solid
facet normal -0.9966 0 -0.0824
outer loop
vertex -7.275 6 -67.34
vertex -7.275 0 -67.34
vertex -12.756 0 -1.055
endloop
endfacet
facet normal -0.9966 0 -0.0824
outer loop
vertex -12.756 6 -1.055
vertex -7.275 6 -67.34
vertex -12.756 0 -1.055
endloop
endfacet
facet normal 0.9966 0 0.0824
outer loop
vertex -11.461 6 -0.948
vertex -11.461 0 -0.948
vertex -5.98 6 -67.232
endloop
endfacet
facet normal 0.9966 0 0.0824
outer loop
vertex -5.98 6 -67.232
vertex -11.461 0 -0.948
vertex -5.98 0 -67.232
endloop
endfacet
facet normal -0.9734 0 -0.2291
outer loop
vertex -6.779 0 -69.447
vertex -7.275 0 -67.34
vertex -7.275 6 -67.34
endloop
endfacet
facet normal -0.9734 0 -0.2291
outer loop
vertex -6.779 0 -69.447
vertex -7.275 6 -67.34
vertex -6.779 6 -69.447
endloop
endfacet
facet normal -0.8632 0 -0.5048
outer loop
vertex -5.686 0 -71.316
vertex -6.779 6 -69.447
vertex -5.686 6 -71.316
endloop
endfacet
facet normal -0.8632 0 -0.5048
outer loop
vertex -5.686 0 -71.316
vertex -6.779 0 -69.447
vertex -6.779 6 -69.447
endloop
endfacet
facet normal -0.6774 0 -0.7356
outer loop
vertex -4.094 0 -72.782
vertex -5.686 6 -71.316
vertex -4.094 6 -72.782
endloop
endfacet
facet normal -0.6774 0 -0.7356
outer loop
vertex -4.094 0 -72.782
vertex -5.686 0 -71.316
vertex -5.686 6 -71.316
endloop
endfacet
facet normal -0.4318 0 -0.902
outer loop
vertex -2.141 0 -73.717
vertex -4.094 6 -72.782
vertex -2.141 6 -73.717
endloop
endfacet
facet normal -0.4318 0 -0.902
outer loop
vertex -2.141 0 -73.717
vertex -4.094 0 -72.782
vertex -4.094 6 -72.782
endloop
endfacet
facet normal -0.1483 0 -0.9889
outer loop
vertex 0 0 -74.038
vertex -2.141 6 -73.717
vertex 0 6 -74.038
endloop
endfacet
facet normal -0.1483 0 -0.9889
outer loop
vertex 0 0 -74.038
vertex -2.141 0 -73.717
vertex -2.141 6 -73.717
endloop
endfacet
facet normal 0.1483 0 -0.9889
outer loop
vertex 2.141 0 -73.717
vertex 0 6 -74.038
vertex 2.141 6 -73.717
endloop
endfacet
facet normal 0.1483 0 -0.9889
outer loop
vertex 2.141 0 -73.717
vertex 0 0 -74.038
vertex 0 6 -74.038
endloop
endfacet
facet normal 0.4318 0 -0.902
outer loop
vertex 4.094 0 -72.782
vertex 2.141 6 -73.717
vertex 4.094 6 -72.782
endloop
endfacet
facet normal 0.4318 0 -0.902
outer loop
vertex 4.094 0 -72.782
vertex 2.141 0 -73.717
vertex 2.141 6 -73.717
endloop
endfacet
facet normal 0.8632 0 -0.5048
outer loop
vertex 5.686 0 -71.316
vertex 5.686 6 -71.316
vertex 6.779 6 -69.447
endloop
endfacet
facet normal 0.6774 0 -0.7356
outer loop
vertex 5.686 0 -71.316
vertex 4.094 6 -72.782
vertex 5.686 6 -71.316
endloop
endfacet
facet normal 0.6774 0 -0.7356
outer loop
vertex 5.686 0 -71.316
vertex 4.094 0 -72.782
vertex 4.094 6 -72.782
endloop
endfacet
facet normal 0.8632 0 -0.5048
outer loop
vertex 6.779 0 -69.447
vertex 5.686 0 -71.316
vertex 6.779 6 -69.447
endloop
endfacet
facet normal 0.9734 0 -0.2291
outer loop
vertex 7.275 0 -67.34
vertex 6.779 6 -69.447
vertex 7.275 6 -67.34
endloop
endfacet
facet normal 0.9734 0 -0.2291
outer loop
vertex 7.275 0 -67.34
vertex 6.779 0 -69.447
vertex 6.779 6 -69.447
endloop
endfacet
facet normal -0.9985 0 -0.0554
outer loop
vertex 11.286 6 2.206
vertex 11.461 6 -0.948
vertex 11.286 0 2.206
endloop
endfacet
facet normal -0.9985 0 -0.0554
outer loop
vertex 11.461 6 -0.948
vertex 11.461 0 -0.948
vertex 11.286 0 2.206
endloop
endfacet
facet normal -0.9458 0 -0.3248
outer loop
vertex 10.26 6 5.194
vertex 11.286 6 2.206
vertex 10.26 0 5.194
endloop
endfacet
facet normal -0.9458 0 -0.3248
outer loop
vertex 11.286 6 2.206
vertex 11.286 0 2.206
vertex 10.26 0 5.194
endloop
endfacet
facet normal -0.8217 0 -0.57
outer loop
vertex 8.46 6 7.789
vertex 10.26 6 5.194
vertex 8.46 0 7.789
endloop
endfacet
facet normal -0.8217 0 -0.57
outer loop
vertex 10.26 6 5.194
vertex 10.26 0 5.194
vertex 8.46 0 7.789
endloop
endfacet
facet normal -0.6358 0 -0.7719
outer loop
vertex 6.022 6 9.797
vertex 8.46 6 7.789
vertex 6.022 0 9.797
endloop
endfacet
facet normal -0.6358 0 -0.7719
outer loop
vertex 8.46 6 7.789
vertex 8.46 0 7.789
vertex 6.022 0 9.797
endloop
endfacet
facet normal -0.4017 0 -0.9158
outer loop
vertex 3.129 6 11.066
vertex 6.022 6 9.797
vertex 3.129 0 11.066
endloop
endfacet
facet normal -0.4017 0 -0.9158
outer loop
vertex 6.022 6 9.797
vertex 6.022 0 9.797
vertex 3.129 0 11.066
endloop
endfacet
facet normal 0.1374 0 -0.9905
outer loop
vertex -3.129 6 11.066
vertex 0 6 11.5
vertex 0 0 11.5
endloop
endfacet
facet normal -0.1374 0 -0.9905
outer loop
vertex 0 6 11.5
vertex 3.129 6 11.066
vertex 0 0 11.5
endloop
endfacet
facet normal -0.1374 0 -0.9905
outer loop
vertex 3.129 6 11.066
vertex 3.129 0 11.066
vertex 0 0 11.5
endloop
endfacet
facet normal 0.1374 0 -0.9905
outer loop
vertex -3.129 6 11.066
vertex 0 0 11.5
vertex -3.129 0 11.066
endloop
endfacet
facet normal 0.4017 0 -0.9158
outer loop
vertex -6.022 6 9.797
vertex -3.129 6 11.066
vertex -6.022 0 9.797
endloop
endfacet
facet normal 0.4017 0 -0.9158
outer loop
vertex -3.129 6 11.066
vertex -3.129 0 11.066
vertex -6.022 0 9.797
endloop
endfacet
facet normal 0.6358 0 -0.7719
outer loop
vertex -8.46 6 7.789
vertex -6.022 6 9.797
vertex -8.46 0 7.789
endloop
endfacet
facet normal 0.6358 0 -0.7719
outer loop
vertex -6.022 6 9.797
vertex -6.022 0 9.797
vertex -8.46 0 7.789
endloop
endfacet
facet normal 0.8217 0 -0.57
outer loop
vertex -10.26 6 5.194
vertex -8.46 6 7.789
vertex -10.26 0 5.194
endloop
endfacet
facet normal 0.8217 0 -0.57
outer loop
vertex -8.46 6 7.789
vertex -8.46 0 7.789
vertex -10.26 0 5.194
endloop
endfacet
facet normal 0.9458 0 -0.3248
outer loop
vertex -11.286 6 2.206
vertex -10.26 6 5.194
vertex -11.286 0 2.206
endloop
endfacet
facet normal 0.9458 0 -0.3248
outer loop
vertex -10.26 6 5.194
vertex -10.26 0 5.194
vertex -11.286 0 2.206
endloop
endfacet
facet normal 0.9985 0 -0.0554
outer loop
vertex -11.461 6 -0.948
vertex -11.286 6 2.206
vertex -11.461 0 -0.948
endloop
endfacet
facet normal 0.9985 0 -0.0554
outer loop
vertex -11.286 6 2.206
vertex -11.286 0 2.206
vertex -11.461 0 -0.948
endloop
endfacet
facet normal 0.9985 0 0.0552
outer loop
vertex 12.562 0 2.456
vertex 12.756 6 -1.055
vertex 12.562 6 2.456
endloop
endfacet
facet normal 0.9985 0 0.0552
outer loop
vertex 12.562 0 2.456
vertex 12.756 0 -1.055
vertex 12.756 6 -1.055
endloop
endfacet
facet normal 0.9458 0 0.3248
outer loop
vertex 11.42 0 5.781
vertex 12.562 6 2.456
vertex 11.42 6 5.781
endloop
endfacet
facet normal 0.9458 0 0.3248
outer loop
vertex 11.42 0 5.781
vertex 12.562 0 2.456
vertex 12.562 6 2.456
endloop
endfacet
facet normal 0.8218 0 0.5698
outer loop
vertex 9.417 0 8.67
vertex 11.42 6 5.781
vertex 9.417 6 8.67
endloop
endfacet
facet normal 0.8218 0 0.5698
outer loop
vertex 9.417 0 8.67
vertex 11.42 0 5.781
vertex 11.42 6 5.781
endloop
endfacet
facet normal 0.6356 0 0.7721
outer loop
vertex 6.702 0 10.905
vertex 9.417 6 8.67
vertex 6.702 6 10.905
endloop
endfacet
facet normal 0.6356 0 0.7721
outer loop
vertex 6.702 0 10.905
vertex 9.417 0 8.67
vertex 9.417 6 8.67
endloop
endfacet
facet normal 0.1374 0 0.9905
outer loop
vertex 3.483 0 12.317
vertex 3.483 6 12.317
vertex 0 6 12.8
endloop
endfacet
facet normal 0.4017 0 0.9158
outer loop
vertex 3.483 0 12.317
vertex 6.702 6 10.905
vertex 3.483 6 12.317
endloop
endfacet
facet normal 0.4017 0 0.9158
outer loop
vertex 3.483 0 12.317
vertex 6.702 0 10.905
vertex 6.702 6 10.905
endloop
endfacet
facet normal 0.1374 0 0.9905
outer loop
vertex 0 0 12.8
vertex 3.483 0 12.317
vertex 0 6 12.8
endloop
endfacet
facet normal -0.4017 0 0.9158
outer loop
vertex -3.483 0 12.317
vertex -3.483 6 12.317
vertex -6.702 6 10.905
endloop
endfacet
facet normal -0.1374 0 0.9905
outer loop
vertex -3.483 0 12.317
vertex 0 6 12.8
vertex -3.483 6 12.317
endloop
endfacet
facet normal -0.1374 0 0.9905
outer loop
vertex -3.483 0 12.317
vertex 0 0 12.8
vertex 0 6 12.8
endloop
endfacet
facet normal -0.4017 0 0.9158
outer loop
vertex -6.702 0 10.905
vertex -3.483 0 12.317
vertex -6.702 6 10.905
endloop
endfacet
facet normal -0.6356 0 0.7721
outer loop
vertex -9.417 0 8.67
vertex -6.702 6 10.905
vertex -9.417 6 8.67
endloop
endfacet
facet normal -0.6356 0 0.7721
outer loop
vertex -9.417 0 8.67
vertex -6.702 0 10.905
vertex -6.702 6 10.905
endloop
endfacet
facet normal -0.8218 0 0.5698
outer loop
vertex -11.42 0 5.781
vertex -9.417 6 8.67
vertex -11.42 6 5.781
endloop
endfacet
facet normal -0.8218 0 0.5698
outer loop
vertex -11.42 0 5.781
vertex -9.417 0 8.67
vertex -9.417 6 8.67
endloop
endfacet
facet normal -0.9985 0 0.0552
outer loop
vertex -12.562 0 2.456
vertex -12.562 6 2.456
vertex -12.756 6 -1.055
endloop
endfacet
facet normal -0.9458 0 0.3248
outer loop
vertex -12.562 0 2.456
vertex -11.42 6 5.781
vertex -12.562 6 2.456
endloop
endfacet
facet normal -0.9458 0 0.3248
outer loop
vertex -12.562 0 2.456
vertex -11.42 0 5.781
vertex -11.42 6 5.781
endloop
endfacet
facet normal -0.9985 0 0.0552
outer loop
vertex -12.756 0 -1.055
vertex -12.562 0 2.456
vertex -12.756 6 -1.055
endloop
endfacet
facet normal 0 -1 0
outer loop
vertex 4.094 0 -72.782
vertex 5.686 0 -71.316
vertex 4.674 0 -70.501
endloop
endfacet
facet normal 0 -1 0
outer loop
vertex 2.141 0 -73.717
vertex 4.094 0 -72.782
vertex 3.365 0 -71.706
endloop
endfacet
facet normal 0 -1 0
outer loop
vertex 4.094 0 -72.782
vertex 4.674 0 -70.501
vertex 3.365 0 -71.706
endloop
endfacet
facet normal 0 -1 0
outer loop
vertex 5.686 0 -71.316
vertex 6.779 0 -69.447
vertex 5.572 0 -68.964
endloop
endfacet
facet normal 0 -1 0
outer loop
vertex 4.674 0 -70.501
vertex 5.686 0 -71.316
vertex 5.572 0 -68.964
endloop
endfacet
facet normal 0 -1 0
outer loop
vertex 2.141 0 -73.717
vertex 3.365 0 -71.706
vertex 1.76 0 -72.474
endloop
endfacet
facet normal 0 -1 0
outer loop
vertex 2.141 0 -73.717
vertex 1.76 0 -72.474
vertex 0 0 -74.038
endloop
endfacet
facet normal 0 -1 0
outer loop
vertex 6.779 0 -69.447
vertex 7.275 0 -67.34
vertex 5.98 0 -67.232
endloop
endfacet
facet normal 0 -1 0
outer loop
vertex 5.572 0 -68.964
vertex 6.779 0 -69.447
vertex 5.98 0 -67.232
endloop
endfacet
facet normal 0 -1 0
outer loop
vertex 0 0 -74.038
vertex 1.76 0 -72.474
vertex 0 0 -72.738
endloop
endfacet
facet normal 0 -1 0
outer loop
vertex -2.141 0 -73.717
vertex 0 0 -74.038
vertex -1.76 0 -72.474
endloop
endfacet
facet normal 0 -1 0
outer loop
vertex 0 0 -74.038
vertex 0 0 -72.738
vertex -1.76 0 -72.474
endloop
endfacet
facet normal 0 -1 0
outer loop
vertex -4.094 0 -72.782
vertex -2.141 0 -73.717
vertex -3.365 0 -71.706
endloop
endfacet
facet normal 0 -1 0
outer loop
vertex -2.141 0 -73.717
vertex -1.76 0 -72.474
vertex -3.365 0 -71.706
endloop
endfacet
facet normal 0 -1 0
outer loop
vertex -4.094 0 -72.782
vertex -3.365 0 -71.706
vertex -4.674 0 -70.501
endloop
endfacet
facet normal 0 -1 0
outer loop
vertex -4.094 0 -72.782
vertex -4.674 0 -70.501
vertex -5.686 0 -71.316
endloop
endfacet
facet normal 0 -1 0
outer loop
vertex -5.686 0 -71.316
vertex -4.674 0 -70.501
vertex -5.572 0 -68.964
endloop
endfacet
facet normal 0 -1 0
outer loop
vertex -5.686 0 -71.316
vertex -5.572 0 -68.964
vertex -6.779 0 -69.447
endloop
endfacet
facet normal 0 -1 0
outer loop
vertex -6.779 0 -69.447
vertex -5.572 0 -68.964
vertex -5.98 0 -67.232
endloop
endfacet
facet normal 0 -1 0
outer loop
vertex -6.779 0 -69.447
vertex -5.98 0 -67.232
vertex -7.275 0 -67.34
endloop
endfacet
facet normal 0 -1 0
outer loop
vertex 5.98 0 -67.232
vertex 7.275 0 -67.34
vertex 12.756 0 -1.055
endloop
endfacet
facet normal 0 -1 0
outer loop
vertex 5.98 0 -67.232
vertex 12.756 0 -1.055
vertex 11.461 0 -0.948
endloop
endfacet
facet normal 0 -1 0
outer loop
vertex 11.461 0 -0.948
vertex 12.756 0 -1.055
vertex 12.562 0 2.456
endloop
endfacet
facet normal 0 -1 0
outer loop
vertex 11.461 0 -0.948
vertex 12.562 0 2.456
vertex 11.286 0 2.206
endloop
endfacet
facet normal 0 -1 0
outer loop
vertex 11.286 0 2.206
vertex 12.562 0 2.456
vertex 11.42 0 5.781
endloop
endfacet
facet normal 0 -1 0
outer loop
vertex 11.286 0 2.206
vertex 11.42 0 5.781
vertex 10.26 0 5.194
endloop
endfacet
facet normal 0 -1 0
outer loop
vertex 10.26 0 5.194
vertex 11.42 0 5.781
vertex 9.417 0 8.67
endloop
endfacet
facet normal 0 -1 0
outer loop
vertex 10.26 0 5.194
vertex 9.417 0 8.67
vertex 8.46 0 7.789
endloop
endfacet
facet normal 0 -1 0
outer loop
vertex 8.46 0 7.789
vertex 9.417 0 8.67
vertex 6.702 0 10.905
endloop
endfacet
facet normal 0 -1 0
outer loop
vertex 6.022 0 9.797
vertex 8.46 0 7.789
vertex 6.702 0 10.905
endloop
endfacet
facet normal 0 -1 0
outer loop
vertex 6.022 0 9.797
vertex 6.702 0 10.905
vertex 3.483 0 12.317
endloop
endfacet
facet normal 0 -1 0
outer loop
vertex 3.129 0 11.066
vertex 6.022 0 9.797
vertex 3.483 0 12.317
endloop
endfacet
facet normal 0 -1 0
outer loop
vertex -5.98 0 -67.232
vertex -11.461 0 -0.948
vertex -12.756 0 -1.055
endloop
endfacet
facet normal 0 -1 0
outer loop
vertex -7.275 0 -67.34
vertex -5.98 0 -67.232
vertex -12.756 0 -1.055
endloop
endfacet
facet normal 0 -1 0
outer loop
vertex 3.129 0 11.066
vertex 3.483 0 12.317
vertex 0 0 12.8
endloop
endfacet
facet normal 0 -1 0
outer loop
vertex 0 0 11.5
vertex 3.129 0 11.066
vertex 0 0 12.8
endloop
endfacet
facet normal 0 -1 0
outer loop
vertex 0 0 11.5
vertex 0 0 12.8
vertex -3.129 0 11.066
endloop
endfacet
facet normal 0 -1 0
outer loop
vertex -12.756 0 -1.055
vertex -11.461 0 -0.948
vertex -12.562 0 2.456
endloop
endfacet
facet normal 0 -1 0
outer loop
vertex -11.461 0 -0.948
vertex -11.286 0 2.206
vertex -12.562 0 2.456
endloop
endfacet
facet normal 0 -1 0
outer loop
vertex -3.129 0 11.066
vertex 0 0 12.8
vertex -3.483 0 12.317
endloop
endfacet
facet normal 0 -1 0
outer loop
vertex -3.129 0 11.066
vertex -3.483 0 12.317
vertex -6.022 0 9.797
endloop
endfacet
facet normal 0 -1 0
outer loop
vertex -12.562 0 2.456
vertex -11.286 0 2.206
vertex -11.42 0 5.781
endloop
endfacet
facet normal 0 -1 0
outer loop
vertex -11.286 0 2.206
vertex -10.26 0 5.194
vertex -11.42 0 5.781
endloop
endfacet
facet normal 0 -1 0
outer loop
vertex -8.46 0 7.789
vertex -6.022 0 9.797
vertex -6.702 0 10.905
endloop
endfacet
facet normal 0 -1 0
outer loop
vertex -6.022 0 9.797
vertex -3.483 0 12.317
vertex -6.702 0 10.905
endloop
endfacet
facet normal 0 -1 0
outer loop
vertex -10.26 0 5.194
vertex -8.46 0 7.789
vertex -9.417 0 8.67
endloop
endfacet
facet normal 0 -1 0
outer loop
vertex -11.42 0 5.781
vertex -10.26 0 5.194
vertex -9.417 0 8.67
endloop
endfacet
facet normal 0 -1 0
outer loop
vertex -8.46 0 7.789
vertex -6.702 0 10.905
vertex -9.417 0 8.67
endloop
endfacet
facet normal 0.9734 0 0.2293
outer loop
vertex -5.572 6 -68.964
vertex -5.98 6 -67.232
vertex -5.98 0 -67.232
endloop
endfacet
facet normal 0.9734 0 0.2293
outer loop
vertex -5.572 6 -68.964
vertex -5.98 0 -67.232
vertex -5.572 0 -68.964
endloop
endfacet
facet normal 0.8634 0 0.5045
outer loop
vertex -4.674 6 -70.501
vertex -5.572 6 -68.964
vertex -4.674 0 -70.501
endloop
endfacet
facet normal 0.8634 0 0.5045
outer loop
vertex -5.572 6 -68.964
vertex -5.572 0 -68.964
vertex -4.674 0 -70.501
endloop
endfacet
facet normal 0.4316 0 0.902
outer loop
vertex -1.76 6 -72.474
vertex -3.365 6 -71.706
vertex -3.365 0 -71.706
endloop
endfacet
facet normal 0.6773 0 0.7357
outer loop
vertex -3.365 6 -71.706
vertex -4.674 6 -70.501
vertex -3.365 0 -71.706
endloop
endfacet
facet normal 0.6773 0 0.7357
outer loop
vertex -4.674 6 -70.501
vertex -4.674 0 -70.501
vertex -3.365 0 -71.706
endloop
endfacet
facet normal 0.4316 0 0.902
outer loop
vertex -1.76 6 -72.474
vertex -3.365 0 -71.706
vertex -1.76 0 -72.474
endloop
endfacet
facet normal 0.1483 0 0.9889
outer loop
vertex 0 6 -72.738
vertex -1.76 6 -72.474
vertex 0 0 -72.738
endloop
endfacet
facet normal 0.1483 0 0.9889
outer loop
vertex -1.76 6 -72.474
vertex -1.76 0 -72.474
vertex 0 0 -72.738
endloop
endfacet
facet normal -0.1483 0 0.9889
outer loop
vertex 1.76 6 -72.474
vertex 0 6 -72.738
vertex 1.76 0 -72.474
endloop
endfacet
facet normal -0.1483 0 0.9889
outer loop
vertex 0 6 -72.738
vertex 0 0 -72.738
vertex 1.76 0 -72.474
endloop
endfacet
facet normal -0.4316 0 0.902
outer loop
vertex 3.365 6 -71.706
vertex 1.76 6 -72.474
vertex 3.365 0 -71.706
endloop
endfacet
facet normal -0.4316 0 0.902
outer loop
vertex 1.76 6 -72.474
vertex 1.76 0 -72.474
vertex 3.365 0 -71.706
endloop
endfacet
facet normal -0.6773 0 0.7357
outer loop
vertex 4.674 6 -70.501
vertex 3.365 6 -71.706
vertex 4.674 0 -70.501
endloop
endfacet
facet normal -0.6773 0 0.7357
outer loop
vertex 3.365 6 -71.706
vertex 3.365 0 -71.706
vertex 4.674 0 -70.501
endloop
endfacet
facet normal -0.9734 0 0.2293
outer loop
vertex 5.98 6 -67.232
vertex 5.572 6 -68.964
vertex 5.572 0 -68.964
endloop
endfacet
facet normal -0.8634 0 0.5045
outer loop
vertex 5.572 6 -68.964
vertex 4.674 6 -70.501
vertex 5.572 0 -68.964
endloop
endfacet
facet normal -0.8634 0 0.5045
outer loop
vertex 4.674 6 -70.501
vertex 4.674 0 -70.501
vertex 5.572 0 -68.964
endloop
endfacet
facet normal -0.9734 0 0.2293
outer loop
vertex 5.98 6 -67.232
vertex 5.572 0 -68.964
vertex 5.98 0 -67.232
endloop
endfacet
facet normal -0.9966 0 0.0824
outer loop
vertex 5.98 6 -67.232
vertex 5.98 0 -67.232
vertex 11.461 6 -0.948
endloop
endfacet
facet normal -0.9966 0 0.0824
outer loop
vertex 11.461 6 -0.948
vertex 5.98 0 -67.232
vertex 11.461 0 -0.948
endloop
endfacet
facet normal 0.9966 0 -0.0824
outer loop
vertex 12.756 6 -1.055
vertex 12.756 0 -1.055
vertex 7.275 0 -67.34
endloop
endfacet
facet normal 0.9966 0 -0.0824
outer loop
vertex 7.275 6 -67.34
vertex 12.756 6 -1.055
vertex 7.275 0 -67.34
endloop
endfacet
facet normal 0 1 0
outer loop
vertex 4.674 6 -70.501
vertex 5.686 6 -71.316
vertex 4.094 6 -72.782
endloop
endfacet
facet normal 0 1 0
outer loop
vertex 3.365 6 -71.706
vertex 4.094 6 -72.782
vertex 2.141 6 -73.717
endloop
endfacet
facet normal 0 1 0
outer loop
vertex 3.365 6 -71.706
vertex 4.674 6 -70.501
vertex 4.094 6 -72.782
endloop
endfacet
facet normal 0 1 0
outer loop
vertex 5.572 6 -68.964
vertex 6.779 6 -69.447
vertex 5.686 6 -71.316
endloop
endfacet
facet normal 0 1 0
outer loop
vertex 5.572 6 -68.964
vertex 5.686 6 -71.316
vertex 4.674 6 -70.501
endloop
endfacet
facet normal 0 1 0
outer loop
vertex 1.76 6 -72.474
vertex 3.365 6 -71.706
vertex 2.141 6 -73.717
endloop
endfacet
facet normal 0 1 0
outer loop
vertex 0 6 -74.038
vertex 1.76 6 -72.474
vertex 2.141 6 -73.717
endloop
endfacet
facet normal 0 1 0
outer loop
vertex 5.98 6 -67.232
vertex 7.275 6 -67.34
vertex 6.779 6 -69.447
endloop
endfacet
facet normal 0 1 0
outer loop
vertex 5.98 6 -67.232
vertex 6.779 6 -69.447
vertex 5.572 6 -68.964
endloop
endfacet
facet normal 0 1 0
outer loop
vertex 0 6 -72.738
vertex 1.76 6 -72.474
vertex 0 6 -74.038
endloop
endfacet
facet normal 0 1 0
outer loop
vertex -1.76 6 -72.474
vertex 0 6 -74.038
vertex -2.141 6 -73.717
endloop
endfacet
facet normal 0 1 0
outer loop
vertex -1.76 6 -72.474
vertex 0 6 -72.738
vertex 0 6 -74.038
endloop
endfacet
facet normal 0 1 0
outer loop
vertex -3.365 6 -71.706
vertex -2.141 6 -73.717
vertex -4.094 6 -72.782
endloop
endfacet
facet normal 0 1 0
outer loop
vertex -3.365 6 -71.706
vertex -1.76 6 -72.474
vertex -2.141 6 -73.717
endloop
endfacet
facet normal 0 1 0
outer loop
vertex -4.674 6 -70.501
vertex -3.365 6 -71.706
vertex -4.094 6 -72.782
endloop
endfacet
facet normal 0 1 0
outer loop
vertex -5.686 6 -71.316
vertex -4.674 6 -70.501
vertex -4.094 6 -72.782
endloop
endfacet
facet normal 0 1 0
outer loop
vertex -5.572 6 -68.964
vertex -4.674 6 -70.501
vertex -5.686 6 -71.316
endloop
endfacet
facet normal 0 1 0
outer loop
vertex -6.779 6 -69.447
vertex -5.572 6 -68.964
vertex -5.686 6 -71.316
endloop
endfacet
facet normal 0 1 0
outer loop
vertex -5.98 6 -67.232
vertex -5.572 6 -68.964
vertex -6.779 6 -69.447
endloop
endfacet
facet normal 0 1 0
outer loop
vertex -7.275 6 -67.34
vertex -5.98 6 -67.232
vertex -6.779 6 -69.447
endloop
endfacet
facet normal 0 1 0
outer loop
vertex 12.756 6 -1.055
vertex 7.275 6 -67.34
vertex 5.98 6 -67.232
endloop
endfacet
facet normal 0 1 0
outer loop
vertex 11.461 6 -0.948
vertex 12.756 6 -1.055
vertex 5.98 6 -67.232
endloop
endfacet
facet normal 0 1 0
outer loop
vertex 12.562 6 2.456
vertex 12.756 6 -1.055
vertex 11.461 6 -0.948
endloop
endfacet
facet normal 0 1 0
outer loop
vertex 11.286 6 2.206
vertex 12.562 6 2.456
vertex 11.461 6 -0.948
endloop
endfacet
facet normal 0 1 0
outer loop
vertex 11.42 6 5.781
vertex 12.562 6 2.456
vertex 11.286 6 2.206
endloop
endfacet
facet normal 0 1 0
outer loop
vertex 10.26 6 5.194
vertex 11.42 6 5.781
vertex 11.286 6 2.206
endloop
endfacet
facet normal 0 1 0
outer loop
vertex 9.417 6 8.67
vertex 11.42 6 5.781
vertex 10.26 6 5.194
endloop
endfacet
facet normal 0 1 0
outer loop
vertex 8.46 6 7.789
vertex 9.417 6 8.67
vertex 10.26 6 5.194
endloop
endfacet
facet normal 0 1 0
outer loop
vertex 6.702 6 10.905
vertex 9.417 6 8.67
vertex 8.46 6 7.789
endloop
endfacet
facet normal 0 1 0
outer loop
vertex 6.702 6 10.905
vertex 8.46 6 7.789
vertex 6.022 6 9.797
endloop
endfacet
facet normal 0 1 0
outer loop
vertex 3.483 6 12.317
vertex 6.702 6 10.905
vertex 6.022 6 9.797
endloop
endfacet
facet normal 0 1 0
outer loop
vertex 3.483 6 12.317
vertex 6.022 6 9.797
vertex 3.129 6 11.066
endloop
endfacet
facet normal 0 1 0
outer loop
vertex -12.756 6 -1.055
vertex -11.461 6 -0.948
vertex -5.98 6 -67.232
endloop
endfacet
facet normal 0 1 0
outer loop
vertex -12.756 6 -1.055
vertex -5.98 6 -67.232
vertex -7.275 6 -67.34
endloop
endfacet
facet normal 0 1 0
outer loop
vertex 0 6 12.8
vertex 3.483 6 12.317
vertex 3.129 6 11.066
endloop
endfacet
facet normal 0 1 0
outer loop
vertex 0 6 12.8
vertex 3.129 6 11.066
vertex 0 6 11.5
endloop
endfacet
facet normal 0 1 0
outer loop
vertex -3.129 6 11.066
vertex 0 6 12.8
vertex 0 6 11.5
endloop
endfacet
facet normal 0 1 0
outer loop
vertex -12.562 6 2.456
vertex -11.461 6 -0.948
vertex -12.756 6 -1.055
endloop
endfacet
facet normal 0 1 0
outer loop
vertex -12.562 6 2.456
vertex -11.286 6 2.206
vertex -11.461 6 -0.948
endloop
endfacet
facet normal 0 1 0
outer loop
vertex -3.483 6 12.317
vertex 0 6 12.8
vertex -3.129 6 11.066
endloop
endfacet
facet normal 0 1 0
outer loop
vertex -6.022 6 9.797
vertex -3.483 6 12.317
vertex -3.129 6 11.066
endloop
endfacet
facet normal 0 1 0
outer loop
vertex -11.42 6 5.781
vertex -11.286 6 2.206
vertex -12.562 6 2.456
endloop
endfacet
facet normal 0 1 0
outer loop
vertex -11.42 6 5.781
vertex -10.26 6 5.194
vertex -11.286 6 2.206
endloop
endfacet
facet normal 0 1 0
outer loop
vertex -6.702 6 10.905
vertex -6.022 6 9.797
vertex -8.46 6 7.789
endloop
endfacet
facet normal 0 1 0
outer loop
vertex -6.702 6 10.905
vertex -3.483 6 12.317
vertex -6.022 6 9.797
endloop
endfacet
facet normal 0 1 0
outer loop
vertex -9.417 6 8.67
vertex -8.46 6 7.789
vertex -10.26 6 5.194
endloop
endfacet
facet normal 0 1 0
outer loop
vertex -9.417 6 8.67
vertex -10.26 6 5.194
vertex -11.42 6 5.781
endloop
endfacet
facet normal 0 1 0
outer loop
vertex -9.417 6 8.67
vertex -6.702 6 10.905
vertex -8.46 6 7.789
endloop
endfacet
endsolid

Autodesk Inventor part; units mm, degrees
ref_plane "YZ Plane" through (0, 0, 0) normal (1, 0, 0) x (0, 1, 0)
ref_plane "XZ Plane" through (0, 0, 0) normal (0, 1, 0) x (-1, 0, 0)
ref_plane "XY Plane" through (0, 0, 0) normal (0, 0, 1) x (1, 0, 0)
sketch "Sketch1" plane through (0, 0, 0) normal (0, 1, 0) x (-1, 0, 0)
  arc A0 (11.4609, -0.9477) -> (-11.4609, -0.9477) centre (0, 0) ccw
  arc A1 (-5.9796, -67.2325) -> (5.9796, -67.2325) centre (0, -66.738) ccw
  line L0 (11.4609, -0.9477) -> (5.9796, -67.2325)
  line L1 (-5.9796, -67.2325) -> (-11.4609, -0.9477)
  line L2 (7.2752, -67.3396) -> (12.7565, -1.0549)
  arc A2 (12.7565, -1.0549) -> (-12.7565, -1.0549) centre (0, 0) ccw
  line L3 (-12.7565, -1.0549) -> (-7.2752, -67.3396)
  arc A3 (-7.2752, -67.3396) -> (7.2752, -67.3396) centre (0, -66.738) ccw
  dimension "d0" = 23
  dimension "d1" = 12
  dimension "d2" = 66.511
  dimension "d6" = 1.3
extrude "Extrusion1" add sketch "Sketch1" along normal blind 6
properties part number "tandriem32Tnaar16T_lengte188"
